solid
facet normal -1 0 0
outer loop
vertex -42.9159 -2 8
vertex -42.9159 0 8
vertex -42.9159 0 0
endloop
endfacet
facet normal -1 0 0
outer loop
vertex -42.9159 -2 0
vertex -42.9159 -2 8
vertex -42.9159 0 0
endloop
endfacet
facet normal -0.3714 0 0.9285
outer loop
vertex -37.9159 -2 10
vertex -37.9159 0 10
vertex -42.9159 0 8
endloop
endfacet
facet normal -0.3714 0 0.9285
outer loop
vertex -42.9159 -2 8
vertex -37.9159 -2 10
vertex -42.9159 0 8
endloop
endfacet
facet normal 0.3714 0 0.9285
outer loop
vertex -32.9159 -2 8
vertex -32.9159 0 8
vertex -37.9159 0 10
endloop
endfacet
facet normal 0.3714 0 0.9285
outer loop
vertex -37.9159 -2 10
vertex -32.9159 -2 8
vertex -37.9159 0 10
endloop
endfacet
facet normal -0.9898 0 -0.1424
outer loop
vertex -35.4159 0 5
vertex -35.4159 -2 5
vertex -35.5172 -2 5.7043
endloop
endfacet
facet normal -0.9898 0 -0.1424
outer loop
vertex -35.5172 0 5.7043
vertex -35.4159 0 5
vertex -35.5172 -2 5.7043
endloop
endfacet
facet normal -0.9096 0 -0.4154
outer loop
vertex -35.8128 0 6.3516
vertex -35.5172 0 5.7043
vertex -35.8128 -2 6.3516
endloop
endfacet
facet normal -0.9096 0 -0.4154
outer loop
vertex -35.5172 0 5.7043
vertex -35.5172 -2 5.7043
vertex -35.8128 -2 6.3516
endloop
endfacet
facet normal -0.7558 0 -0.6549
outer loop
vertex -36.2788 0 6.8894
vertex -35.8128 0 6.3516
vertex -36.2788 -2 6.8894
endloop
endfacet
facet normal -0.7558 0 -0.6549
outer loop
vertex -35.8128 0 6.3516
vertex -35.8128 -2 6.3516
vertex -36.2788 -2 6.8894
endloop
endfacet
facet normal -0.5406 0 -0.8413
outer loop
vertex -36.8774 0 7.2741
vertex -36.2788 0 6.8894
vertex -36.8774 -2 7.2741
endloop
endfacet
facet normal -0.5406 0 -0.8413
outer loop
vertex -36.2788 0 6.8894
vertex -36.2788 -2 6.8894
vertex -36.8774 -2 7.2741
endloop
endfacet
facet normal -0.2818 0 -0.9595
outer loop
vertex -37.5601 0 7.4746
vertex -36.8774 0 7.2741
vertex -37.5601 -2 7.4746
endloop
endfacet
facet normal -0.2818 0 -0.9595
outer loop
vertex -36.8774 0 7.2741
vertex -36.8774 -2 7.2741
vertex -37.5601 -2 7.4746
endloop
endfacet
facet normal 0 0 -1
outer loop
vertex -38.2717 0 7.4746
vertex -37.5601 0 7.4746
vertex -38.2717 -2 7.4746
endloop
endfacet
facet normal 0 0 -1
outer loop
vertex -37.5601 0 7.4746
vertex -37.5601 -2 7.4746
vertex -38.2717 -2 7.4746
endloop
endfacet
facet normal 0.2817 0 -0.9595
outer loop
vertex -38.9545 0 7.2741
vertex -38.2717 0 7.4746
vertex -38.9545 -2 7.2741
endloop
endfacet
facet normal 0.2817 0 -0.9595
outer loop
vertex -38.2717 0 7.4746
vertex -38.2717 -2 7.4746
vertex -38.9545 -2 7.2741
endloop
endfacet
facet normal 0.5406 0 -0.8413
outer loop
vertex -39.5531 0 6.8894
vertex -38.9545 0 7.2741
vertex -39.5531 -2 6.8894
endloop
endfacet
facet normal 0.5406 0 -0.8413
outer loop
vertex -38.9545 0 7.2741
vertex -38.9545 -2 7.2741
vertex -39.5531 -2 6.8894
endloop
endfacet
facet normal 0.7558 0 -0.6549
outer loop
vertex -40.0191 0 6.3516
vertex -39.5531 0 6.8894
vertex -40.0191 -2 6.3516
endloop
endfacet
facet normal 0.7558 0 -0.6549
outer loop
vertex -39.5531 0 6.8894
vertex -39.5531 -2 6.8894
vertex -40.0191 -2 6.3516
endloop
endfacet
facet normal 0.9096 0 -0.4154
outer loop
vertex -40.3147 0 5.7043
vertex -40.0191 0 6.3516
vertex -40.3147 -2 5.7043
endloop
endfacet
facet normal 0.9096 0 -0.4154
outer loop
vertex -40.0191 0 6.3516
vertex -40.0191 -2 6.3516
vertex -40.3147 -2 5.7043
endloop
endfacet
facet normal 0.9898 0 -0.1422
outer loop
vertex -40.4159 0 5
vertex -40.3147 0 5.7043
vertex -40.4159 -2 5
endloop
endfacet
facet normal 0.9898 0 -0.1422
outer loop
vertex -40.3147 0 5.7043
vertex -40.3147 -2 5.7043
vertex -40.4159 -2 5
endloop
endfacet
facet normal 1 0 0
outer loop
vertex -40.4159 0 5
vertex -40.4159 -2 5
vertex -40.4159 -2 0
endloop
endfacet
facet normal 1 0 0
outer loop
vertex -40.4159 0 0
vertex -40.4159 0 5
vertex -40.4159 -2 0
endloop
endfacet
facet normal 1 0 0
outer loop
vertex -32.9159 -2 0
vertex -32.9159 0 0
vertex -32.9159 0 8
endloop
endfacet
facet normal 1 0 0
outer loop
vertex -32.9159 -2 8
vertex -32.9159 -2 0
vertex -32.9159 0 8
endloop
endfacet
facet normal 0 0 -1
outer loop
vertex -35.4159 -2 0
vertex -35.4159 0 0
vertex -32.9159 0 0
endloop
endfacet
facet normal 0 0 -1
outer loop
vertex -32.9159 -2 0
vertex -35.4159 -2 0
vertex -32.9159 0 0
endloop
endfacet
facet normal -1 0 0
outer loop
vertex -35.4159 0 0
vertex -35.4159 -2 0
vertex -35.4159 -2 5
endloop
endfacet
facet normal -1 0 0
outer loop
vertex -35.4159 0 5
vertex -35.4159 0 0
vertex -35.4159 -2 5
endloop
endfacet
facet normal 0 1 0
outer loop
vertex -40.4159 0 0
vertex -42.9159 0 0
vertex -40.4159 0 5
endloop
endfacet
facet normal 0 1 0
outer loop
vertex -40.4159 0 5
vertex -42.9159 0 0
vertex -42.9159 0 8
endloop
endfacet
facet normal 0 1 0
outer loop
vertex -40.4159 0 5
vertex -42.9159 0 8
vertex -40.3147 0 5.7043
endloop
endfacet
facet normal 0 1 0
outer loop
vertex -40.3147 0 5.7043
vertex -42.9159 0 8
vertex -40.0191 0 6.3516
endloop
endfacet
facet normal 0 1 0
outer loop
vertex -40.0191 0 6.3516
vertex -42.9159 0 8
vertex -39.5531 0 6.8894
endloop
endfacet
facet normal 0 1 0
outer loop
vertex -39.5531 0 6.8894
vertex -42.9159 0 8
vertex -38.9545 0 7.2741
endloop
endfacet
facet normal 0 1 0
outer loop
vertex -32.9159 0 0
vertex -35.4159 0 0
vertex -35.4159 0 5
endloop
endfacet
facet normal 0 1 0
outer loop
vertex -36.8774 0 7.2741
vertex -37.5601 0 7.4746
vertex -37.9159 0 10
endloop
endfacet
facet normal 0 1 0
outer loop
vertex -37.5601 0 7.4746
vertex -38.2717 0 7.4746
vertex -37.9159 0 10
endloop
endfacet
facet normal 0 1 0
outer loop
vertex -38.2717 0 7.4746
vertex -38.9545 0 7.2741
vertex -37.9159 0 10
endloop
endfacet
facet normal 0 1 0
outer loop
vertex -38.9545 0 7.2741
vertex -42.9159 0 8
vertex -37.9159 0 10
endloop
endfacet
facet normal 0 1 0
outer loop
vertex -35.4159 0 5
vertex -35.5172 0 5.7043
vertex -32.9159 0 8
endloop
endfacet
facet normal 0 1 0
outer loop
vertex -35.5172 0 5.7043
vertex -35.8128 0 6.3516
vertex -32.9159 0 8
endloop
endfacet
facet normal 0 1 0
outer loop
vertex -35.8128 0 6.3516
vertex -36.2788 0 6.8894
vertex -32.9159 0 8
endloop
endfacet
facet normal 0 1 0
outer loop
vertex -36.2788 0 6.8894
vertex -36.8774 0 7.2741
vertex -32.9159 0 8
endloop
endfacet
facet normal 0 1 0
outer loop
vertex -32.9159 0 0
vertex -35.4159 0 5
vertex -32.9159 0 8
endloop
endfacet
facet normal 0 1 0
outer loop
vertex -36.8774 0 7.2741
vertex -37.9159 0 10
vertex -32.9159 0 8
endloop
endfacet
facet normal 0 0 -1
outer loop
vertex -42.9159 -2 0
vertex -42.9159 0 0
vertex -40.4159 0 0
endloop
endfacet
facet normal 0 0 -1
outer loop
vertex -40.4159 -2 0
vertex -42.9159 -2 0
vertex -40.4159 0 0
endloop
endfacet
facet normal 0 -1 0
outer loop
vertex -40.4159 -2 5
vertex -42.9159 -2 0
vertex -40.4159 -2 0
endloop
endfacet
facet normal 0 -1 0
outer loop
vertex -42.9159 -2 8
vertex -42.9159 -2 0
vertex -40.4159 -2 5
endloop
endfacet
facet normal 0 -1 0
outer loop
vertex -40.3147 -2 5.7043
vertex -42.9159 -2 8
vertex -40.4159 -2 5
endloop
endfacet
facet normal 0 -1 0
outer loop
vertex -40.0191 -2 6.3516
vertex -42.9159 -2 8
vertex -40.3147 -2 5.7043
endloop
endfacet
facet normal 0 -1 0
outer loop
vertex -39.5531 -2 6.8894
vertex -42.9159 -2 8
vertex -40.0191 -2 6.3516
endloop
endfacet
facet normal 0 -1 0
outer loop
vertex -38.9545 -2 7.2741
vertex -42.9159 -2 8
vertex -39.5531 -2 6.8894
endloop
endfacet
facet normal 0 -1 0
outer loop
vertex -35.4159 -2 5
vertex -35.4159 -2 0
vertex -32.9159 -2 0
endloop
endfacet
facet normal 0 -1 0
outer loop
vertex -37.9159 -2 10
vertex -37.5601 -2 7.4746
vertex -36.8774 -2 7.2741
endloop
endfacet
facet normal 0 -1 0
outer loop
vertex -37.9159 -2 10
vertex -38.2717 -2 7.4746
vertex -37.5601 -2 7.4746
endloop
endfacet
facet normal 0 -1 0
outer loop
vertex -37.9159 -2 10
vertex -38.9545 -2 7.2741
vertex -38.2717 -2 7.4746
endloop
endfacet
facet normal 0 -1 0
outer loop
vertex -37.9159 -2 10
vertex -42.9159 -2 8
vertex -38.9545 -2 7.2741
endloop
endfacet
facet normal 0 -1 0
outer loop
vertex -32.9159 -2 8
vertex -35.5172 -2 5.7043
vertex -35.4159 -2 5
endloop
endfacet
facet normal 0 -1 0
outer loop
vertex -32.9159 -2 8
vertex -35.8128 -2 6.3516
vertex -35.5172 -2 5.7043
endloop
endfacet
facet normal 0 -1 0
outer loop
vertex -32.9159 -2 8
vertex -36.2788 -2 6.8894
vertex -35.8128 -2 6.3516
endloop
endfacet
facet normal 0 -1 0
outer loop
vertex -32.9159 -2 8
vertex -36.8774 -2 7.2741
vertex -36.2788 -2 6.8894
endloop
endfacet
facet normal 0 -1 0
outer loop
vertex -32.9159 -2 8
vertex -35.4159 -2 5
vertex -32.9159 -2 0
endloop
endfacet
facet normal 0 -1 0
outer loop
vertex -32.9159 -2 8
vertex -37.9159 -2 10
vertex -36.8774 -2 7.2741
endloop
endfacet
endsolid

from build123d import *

# Parameters (mm, degrees)
F1_DEPTH = 2
F3_DEPTH = 25


with BuildPart() as f1:
    # F0 (on Front) → F1 (new body)
    with BuildSketch(Plane.XZ):
        Polygon((-42.915918, 8), (-42.915918, 0), (-32.915918, 0), (-32.915918, 8), (-37.915918, 10), align=None)
    extrude(amount=F1_DEPTH)

    # F2 (on face) → F3 (cut)
    with BuildSketch(Plane.XZ.offset(2)):
        with BuildLine():
            ThreePointArc((-35.415918, 5), (-37.915918, 7.5), (-40.415918, 5))
            Line((-40.415918, 5), (-40.415918, 0))
            Line((-40.415918, 0), (-37.915918, 0))
            Line((-37.915918, 0), (-35.415918, 0))
            Line((-35.415918, 0), (-35.415918, 5))
        make_face()
    extrude(amount=-F3_DEPTH, mode=Mode.SUBTRACT)


solid = f1.part
